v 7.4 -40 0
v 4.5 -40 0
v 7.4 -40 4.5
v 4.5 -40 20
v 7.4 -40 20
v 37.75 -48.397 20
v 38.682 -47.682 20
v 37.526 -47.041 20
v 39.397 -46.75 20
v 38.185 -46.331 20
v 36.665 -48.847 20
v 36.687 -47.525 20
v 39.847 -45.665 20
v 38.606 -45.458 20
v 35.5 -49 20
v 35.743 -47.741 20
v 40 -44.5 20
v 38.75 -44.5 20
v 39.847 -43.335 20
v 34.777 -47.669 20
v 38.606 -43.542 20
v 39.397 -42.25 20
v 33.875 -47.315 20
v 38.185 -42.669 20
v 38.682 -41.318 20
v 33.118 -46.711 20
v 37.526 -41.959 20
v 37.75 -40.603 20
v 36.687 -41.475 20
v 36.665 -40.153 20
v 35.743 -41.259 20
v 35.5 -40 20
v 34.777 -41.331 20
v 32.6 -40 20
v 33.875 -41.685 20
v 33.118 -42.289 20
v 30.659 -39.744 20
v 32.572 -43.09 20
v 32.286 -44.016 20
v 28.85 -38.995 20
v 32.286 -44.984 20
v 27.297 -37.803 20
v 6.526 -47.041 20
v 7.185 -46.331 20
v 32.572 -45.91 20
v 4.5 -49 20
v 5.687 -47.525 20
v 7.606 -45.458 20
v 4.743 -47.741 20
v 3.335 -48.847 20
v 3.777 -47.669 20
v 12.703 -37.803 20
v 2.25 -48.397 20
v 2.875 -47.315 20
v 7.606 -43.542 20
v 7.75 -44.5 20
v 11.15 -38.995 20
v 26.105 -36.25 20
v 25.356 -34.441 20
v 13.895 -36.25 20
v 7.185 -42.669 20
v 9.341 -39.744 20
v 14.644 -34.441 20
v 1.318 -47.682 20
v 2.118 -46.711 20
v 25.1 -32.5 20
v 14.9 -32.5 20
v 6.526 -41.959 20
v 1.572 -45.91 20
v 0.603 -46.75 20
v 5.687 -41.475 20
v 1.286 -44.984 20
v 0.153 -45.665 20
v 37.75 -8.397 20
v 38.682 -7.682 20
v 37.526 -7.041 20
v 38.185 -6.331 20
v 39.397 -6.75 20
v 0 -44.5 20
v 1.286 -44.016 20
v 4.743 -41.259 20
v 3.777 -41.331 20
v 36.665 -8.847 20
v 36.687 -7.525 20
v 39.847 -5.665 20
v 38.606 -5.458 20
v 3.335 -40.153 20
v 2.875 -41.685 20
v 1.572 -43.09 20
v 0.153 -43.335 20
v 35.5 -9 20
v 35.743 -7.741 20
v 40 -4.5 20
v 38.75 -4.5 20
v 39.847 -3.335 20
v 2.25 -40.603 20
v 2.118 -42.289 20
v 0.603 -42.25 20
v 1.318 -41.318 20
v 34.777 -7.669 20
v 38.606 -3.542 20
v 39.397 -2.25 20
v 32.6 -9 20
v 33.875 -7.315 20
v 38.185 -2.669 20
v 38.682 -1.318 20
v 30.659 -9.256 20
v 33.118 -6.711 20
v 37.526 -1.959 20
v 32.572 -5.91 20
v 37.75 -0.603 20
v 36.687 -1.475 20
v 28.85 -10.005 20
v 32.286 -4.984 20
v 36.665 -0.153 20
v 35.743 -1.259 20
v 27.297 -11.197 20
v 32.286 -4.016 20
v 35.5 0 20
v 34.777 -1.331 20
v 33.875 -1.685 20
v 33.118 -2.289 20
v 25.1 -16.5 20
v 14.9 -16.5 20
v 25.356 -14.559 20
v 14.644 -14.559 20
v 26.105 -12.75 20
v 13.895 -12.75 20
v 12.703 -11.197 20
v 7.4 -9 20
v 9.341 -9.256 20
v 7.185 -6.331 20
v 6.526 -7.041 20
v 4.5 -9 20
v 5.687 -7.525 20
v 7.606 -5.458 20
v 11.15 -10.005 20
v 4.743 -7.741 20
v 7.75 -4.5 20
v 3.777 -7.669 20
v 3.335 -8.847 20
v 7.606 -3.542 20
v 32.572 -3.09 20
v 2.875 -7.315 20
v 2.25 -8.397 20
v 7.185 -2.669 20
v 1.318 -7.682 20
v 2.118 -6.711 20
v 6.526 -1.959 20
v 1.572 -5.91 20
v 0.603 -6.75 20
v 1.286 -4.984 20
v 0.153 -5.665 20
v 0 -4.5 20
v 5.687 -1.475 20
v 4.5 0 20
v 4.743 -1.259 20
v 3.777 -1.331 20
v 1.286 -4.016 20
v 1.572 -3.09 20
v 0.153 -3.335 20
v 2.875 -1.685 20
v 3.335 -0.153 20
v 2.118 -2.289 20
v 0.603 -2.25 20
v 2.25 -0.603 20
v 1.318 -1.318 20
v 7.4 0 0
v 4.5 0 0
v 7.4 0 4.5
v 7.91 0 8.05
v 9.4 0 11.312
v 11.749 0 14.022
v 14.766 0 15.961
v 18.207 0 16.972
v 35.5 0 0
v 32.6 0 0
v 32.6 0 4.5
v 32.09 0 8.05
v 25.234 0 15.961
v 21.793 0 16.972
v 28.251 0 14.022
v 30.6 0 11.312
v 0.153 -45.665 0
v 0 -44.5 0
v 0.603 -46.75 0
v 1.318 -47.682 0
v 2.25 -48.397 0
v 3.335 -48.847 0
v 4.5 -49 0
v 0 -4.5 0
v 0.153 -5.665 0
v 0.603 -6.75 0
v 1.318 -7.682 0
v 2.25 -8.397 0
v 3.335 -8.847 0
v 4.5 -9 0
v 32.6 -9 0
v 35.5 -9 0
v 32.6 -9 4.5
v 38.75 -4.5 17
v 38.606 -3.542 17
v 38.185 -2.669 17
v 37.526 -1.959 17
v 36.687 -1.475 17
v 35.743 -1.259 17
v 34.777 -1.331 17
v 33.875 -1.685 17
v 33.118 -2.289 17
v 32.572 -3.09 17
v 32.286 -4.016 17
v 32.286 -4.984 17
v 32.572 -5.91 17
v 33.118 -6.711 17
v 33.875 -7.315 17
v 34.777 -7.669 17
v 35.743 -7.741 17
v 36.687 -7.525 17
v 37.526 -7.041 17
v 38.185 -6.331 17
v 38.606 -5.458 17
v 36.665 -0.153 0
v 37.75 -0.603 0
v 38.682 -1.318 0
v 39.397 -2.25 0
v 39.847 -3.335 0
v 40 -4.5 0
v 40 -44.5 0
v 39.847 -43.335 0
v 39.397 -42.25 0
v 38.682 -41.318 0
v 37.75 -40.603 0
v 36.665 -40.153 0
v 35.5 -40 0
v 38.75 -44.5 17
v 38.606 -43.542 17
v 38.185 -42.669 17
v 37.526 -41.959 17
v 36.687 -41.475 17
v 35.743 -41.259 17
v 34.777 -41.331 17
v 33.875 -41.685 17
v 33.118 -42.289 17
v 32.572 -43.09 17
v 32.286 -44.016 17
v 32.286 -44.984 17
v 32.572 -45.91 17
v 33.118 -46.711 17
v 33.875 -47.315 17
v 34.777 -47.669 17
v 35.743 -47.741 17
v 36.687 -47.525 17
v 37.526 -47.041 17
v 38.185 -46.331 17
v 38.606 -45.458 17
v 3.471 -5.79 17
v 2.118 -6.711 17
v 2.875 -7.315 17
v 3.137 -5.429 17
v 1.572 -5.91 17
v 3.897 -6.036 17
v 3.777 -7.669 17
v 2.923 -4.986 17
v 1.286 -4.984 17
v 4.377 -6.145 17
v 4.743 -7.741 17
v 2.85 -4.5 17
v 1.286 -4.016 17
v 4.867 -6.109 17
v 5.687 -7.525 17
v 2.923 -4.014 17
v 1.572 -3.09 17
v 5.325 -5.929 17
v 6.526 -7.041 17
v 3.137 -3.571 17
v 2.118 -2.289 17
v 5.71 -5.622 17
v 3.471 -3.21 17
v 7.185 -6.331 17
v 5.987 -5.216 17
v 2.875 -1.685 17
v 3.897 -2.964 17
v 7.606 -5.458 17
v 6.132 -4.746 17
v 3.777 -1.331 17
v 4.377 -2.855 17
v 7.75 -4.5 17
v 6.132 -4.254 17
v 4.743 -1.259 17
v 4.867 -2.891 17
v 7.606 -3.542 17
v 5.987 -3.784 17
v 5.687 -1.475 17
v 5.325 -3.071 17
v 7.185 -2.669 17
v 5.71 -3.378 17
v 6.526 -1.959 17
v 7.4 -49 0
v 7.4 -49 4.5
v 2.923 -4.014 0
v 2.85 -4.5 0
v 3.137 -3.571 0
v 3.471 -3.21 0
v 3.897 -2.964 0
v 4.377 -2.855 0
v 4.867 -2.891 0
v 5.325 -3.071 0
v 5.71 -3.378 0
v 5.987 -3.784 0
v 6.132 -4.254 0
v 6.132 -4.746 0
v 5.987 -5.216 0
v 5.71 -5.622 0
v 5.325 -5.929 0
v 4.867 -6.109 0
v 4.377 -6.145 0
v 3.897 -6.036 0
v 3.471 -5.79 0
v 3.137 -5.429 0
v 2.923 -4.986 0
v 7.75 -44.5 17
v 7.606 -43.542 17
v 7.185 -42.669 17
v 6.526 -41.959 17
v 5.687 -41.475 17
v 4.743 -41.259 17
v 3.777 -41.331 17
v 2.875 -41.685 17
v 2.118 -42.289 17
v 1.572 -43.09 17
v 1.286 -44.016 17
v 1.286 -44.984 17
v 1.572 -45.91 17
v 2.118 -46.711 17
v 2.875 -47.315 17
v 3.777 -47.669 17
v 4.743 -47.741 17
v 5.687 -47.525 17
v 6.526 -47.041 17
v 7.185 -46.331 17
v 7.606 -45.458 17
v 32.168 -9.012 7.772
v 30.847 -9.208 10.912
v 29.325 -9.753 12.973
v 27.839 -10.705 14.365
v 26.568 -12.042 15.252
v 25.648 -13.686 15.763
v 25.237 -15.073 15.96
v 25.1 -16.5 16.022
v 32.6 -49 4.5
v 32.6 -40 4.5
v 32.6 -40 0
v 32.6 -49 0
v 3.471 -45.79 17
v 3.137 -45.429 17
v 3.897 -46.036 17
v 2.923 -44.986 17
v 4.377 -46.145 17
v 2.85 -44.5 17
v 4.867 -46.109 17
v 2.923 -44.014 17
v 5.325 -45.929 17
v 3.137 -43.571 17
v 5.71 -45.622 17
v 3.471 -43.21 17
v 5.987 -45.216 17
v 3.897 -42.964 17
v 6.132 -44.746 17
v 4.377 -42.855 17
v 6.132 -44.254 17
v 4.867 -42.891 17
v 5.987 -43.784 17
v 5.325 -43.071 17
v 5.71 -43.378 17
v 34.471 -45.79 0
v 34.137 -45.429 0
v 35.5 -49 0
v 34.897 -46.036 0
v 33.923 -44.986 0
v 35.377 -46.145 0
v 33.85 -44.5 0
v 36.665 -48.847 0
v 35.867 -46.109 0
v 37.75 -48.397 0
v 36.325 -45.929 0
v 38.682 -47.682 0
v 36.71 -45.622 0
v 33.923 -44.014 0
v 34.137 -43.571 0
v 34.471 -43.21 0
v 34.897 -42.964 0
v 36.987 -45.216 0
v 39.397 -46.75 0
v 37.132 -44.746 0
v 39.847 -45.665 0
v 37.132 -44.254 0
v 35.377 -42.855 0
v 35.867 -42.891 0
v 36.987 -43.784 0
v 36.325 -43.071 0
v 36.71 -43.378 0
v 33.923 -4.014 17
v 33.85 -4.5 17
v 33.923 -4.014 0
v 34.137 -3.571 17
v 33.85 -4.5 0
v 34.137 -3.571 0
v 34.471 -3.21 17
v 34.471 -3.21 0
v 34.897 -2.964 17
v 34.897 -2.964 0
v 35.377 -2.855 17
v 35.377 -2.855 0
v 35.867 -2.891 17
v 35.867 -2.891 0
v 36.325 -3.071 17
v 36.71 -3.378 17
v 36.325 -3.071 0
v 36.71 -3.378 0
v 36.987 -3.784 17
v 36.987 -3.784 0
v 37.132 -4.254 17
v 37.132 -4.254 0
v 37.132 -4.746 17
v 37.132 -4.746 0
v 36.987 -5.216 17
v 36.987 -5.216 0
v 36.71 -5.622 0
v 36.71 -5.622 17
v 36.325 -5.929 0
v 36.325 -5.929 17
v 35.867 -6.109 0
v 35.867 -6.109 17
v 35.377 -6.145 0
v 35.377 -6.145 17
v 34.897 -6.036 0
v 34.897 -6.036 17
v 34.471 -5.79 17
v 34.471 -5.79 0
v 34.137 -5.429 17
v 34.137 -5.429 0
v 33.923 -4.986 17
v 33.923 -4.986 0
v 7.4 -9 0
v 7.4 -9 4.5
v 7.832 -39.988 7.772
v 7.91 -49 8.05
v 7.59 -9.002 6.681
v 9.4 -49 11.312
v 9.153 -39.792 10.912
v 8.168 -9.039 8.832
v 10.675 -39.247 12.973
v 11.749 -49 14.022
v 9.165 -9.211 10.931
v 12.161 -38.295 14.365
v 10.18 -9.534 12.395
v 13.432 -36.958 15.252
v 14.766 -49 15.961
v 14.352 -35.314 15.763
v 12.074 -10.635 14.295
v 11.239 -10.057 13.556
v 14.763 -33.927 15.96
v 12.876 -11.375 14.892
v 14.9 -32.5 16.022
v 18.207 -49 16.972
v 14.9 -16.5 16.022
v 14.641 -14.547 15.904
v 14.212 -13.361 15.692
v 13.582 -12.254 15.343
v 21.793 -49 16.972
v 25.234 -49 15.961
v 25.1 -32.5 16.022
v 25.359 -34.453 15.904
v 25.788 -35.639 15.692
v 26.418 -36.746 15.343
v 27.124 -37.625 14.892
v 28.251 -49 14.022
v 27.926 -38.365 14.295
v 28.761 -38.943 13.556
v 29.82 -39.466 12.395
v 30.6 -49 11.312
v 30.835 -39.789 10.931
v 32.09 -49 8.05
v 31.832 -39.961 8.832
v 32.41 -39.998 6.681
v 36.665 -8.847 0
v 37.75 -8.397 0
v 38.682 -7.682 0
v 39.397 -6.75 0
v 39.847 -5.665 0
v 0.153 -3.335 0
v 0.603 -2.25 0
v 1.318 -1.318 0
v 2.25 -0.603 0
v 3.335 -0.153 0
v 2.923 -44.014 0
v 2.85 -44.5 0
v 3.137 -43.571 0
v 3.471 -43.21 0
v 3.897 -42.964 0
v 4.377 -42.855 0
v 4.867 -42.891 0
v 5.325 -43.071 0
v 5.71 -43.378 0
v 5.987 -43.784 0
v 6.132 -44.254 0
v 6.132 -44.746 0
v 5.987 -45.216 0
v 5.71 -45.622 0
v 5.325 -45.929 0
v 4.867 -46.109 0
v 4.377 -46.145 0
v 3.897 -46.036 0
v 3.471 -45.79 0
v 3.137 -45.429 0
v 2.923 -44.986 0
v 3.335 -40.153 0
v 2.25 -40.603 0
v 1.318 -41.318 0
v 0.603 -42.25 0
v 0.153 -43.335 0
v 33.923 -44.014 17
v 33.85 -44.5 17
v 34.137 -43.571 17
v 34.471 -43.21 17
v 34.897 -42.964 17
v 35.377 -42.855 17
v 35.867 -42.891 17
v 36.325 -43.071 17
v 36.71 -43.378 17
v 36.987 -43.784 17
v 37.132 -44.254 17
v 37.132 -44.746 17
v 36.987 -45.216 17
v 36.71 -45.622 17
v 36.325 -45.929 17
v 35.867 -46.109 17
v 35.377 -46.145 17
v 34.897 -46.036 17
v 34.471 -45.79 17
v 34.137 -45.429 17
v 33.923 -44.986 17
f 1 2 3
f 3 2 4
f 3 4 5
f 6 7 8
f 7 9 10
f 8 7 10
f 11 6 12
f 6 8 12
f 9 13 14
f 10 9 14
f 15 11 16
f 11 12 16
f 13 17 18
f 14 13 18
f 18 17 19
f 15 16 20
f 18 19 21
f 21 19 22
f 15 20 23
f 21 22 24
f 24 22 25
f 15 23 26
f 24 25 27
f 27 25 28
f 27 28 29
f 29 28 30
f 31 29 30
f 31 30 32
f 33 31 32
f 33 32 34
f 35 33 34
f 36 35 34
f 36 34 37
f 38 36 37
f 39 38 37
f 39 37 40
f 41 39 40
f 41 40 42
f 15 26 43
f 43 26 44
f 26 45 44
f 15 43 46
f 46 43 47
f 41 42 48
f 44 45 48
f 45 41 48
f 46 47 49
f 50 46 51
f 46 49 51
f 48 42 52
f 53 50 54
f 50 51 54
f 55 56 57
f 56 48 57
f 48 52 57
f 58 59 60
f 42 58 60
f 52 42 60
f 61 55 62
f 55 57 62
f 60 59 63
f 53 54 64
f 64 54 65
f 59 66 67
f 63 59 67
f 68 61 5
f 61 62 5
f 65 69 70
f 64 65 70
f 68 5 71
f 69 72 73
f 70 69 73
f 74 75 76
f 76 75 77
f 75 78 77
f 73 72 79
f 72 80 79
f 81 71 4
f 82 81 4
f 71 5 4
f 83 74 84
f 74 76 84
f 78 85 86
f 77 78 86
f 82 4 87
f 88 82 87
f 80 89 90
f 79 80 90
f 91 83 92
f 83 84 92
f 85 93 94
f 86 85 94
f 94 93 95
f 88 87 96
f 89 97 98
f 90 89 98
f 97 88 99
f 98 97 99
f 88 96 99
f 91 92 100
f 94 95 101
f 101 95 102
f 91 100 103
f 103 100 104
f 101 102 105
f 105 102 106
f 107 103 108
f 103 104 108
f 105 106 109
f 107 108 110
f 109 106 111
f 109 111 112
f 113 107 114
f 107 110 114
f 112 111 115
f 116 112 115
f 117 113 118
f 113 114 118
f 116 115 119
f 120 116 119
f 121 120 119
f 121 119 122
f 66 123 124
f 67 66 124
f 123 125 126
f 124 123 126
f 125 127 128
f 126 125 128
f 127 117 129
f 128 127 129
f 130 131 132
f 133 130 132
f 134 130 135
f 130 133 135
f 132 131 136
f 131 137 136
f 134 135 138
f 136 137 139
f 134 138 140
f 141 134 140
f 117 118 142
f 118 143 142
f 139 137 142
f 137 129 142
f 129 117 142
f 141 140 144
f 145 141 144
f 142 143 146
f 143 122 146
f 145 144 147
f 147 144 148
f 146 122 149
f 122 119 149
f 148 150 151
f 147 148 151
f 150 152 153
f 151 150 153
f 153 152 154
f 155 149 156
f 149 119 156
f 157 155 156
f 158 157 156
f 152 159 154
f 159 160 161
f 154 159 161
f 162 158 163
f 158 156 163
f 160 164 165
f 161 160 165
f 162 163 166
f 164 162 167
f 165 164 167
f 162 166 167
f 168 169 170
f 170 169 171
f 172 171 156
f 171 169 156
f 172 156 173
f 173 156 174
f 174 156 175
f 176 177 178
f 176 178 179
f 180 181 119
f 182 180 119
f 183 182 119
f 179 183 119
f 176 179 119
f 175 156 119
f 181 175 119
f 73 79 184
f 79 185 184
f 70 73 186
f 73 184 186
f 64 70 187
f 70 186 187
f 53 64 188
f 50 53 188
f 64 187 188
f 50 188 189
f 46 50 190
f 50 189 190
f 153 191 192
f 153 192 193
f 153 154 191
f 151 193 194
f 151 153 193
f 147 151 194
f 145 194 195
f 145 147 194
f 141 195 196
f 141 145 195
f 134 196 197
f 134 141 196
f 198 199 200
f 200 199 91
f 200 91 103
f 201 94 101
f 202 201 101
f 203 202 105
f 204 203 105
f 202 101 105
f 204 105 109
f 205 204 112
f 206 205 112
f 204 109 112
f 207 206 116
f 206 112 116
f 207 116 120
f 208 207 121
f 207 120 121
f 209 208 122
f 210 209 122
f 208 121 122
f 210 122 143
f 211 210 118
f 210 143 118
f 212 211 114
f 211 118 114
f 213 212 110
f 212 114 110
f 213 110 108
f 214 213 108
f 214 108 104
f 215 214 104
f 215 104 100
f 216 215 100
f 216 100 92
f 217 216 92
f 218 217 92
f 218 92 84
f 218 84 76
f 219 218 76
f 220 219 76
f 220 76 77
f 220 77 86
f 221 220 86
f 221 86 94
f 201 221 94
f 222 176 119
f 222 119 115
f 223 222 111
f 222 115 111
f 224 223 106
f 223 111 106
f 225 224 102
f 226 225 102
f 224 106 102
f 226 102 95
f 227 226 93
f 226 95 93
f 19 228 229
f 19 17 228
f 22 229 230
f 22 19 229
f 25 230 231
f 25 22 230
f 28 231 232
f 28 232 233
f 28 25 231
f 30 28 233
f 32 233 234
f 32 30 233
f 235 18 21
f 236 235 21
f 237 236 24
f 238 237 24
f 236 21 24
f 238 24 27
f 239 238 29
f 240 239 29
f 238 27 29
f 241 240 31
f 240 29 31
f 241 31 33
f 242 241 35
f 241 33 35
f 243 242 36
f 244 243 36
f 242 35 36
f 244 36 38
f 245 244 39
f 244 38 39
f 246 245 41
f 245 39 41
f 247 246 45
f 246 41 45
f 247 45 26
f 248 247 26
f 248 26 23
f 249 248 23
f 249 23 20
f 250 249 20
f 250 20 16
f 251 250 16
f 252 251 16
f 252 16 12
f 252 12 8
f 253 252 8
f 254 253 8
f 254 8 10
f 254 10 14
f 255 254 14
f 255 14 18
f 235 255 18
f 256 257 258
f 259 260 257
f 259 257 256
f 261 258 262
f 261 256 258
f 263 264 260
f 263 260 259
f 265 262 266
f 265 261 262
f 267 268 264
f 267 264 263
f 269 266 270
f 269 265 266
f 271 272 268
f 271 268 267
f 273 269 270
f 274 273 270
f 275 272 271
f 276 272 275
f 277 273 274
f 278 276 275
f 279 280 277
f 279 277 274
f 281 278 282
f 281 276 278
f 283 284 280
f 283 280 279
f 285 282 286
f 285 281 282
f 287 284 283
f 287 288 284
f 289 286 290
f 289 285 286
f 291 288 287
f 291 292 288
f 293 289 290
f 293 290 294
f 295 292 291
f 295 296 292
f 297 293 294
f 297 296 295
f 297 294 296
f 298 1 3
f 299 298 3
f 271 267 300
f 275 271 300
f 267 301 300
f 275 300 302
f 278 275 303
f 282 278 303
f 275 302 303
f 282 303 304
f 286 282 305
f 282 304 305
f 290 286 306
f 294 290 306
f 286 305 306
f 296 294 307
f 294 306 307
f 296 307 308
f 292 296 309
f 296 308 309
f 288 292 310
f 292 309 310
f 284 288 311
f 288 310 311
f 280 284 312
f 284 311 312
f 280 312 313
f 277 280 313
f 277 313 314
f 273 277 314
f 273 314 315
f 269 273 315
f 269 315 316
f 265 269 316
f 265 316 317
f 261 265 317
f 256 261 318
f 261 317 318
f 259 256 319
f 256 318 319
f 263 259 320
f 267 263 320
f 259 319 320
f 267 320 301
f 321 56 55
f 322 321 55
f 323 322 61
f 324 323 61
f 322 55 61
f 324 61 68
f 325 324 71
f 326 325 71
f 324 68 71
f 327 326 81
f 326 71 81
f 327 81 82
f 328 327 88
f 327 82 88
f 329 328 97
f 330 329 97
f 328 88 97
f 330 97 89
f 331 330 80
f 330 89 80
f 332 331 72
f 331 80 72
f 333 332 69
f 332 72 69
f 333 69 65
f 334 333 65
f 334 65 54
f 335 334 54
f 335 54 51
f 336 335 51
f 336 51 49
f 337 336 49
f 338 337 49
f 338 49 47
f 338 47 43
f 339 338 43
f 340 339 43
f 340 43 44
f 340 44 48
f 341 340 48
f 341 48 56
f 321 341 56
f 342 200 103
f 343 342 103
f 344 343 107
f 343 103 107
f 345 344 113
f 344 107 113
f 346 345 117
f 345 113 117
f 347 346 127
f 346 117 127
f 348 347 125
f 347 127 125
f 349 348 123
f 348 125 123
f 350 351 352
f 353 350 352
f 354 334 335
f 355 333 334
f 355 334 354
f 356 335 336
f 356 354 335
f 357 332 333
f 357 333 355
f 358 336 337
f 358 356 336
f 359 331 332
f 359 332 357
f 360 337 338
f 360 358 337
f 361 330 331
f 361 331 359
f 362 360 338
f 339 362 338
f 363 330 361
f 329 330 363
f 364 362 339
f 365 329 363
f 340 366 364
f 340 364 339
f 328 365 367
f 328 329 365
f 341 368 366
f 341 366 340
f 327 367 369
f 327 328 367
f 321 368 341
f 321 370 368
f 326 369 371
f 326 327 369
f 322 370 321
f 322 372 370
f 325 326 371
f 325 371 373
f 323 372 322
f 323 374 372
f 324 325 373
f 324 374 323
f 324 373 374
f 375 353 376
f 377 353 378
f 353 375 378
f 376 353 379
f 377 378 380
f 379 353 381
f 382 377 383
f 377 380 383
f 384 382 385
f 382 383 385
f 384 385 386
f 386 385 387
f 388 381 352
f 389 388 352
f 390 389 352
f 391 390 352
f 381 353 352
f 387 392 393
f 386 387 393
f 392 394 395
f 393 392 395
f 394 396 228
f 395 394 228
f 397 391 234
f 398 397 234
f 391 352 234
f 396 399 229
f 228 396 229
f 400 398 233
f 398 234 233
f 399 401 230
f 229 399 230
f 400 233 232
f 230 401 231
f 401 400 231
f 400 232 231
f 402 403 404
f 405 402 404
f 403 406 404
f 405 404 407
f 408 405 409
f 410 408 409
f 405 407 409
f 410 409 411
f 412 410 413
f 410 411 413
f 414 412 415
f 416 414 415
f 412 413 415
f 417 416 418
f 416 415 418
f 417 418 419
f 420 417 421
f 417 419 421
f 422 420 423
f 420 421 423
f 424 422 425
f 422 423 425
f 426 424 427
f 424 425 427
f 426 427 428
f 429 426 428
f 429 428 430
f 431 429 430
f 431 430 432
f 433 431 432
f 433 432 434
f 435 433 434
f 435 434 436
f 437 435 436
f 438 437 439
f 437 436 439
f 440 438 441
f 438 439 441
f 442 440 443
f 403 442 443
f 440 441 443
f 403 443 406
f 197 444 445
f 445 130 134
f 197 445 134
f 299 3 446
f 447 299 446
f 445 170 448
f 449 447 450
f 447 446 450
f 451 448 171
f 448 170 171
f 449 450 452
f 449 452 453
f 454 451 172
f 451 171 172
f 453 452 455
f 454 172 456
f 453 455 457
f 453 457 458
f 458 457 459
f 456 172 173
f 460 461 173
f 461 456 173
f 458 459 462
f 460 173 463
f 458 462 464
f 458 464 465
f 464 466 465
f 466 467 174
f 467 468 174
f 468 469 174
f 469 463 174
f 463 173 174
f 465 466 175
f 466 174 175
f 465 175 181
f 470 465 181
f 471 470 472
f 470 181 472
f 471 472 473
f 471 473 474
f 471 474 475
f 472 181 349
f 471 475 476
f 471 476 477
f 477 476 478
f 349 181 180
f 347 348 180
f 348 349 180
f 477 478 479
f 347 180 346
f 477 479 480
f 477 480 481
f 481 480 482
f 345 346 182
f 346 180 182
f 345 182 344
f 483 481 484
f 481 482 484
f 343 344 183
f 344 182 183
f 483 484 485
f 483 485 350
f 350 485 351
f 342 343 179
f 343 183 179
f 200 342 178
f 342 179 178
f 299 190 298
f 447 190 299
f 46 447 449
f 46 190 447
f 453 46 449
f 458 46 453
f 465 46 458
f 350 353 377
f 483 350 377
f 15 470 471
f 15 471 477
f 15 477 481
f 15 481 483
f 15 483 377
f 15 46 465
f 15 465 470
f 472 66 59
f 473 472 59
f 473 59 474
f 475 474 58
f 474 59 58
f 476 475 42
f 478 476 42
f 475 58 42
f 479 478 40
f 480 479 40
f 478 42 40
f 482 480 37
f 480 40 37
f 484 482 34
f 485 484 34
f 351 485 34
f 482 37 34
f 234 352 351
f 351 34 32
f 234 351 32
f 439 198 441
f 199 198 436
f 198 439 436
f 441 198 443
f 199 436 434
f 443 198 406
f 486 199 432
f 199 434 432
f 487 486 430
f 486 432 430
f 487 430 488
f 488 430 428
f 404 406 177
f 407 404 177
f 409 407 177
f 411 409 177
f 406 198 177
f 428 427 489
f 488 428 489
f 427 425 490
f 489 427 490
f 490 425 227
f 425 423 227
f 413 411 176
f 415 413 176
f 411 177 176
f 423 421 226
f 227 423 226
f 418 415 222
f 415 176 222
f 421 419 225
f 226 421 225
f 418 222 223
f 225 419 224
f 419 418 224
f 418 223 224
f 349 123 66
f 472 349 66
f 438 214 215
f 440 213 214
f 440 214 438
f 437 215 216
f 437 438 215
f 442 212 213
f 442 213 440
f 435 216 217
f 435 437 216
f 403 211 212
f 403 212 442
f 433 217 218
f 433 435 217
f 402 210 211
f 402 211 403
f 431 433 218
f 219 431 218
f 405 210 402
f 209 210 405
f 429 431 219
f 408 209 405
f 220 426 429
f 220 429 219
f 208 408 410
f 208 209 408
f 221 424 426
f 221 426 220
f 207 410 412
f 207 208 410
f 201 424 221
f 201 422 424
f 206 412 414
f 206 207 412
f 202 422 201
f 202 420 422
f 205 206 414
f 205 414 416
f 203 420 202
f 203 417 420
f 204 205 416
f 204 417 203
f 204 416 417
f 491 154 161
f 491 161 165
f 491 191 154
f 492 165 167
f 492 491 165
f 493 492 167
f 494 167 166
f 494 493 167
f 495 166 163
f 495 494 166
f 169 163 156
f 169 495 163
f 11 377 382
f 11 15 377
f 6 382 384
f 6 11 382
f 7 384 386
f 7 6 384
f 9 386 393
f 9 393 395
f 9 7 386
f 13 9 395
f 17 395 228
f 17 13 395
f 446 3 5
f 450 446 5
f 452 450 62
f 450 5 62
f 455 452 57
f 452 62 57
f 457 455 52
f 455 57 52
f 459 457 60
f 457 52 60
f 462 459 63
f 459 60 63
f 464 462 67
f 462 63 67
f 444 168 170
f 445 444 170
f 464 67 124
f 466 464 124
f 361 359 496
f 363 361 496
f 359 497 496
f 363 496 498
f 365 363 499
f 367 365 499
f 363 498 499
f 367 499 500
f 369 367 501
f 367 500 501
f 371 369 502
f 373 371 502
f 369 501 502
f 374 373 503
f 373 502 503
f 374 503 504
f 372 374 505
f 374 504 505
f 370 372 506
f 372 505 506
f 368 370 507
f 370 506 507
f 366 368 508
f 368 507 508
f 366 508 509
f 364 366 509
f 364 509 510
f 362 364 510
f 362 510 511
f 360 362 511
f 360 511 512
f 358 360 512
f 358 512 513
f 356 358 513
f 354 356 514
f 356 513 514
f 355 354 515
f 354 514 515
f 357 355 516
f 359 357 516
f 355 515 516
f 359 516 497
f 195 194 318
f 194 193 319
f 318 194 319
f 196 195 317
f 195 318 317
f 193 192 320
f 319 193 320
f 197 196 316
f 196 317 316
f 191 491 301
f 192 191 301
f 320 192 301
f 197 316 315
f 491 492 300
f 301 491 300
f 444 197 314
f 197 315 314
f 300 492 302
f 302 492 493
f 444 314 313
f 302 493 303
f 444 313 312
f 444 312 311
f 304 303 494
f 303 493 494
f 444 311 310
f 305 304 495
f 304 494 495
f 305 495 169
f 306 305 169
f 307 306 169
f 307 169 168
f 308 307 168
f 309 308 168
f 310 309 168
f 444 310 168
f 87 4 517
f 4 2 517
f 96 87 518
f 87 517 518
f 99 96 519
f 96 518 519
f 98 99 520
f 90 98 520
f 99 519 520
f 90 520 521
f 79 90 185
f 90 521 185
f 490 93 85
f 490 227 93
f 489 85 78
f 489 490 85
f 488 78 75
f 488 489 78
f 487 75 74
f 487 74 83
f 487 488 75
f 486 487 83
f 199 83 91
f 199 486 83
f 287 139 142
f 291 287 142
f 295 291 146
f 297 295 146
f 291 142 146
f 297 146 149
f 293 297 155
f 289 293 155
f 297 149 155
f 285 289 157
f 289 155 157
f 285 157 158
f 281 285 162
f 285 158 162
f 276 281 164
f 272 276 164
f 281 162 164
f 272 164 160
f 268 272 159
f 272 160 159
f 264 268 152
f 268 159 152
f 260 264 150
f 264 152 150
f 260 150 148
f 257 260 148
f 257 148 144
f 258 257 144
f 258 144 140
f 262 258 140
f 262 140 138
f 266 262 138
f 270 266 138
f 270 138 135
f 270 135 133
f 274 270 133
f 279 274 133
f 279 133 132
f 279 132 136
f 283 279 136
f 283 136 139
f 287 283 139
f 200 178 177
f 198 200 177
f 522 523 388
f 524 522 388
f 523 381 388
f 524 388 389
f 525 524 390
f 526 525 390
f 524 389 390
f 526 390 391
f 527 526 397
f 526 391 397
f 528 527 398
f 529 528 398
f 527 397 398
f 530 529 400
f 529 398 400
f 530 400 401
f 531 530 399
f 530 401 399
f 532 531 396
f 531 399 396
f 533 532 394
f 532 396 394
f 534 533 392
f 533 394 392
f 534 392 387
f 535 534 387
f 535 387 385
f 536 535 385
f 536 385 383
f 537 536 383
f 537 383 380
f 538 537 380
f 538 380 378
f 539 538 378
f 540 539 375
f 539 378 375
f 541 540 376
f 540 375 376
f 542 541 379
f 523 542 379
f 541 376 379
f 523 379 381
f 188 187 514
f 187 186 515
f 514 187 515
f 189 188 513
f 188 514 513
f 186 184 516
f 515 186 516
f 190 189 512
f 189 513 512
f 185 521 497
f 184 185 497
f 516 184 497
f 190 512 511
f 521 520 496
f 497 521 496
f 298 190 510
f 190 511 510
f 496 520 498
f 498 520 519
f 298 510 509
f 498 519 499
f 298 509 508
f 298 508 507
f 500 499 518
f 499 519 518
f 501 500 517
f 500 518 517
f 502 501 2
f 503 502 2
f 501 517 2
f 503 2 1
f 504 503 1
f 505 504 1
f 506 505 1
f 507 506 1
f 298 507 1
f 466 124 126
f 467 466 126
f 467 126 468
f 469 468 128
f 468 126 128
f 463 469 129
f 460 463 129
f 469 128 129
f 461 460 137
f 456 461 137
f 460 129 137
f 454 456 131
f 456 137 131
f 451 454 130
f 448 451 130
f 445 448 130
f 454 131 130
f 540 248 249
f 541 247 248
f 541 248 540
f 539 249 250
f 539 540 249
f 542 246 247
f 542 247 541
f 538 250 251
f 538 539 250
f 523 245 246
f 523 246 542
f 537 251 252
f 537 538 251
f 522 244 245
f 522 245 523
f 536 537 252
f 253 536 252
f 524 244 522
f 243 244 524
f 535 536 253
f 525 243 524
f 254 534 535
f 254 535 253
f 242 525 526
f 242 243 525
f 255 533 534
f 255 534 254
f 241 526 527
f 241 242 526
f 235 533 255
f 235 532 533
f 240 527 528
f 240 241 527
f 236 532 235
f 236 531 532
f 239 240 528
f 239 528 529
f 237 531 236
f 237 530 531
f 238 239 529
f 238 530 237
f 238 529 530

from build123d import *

# Parameters (mm, degrees)
F1_DEPTH       = 49
F3_D           = 3.3
F3_DEPTH       = 30
F3_CBORE_D     = 6.5
F3_CBORE_DEPTH = 3
F3_TIP         = 0.9914200214
F5_DEPTH       = 25
F6_R           = 4.49999


# Not quite as in the source:
# - a fillet or chamfer is up to 0.001 mm smaller than in the source, because OpenCascade refuses the exact size


with BuildPart() as f1:
    # F0 (on Front) → F1 (new body)
    with BuildSketch(Plane.XZ):
        with BuildLine():
            Line((0, 20), (0, 0))
            Line((0, 0), (7.4, 0))
            Line((7.4, 0), (7.4, 4.5))
            ThreePointArc((7.4, 4.5), (20, 17.1), (32.6, 4.5))
            Line((32.6, 4.5), (32.6, 0))
            Line((32.6, 0), (40, 0))
            Line((40, 0), (40, 20))
            Line((40, 20), (0, 20))
        make_face()
    extrude(amount=F1_DEPTH)

    # F3
    with Locations(Plane.XY.offset(20)):
        with Locations((4.5, -4.5), (4.5, -44.5), (35.5, -44.5), (35.5, -4.5)):
            CounterBoreHole(F3_D / 2, F3_CBORE_D / 2, F3_CBORE_DEPTH, depth=F3_DEPTH)
            with Locations((0, 0, -(F3_DEPTH + F3_TIP / 2))):  # 118° drill point
                Cone(0, F3_D / 2, F3_TIP, mode=Mode.SUBTRACT)

    # F4 (on face) → F5 (cut)
    with BuildSketch(Plane.XY.offset(20)):
        with BuildLine():
            Line((14.9, -32.5), (14.9, -16.5))
            ThreePointArc((14.9, -16.5), (12.7033008589, -11.1966991411), (7.4, -9))
            Line((7.4, -9), (-0.1, -9))
            Line((-0.1, -9), (-0.1, -40))
            Line((-0.1, -40), (7.4, -40))
            ThreePointArc((7.4, -40), (12.7033008589, -37.8033008589), (14.9, -32.5))
        make_face()
        with BuildLine():
            ThreePointArc((32.6, -9), (27.2966991411, -11.1966991411), (25.1, -16.5))
            Line((25.1, -16.5), (25.1, -32.5))
            ThreePointArc((25.1, -32.5), (27.2966991411, -37.8033008589), (32.6, -40))
            Line((32.6, -40), (40.1, -40))
            Line((40.1, -40), (40.1, -9))
            Line((40.1, -9), (32.6, -9))
        make_face()
    extrude(amount=-F5_DEPTH, mode=Mode.SUBTRACT)

    # F6 (radius 4.5 in the source; OpenCascade refuses exactly that, so slightly less here)
    f6_edges = [f1.edges().sort_by_distance(p)[0] for p in [
        (40, -49, 10),
        (0, -49, 10),
        (40, 0, 10),
        (0, 0, 10),
        (40, -9, 10),
        (40, -40, 10),
        (0, -40, 10),
        (0, -9, 10),
    ]]
    fillet(f6_edges, radius=F6_R)


solid = f1.part
